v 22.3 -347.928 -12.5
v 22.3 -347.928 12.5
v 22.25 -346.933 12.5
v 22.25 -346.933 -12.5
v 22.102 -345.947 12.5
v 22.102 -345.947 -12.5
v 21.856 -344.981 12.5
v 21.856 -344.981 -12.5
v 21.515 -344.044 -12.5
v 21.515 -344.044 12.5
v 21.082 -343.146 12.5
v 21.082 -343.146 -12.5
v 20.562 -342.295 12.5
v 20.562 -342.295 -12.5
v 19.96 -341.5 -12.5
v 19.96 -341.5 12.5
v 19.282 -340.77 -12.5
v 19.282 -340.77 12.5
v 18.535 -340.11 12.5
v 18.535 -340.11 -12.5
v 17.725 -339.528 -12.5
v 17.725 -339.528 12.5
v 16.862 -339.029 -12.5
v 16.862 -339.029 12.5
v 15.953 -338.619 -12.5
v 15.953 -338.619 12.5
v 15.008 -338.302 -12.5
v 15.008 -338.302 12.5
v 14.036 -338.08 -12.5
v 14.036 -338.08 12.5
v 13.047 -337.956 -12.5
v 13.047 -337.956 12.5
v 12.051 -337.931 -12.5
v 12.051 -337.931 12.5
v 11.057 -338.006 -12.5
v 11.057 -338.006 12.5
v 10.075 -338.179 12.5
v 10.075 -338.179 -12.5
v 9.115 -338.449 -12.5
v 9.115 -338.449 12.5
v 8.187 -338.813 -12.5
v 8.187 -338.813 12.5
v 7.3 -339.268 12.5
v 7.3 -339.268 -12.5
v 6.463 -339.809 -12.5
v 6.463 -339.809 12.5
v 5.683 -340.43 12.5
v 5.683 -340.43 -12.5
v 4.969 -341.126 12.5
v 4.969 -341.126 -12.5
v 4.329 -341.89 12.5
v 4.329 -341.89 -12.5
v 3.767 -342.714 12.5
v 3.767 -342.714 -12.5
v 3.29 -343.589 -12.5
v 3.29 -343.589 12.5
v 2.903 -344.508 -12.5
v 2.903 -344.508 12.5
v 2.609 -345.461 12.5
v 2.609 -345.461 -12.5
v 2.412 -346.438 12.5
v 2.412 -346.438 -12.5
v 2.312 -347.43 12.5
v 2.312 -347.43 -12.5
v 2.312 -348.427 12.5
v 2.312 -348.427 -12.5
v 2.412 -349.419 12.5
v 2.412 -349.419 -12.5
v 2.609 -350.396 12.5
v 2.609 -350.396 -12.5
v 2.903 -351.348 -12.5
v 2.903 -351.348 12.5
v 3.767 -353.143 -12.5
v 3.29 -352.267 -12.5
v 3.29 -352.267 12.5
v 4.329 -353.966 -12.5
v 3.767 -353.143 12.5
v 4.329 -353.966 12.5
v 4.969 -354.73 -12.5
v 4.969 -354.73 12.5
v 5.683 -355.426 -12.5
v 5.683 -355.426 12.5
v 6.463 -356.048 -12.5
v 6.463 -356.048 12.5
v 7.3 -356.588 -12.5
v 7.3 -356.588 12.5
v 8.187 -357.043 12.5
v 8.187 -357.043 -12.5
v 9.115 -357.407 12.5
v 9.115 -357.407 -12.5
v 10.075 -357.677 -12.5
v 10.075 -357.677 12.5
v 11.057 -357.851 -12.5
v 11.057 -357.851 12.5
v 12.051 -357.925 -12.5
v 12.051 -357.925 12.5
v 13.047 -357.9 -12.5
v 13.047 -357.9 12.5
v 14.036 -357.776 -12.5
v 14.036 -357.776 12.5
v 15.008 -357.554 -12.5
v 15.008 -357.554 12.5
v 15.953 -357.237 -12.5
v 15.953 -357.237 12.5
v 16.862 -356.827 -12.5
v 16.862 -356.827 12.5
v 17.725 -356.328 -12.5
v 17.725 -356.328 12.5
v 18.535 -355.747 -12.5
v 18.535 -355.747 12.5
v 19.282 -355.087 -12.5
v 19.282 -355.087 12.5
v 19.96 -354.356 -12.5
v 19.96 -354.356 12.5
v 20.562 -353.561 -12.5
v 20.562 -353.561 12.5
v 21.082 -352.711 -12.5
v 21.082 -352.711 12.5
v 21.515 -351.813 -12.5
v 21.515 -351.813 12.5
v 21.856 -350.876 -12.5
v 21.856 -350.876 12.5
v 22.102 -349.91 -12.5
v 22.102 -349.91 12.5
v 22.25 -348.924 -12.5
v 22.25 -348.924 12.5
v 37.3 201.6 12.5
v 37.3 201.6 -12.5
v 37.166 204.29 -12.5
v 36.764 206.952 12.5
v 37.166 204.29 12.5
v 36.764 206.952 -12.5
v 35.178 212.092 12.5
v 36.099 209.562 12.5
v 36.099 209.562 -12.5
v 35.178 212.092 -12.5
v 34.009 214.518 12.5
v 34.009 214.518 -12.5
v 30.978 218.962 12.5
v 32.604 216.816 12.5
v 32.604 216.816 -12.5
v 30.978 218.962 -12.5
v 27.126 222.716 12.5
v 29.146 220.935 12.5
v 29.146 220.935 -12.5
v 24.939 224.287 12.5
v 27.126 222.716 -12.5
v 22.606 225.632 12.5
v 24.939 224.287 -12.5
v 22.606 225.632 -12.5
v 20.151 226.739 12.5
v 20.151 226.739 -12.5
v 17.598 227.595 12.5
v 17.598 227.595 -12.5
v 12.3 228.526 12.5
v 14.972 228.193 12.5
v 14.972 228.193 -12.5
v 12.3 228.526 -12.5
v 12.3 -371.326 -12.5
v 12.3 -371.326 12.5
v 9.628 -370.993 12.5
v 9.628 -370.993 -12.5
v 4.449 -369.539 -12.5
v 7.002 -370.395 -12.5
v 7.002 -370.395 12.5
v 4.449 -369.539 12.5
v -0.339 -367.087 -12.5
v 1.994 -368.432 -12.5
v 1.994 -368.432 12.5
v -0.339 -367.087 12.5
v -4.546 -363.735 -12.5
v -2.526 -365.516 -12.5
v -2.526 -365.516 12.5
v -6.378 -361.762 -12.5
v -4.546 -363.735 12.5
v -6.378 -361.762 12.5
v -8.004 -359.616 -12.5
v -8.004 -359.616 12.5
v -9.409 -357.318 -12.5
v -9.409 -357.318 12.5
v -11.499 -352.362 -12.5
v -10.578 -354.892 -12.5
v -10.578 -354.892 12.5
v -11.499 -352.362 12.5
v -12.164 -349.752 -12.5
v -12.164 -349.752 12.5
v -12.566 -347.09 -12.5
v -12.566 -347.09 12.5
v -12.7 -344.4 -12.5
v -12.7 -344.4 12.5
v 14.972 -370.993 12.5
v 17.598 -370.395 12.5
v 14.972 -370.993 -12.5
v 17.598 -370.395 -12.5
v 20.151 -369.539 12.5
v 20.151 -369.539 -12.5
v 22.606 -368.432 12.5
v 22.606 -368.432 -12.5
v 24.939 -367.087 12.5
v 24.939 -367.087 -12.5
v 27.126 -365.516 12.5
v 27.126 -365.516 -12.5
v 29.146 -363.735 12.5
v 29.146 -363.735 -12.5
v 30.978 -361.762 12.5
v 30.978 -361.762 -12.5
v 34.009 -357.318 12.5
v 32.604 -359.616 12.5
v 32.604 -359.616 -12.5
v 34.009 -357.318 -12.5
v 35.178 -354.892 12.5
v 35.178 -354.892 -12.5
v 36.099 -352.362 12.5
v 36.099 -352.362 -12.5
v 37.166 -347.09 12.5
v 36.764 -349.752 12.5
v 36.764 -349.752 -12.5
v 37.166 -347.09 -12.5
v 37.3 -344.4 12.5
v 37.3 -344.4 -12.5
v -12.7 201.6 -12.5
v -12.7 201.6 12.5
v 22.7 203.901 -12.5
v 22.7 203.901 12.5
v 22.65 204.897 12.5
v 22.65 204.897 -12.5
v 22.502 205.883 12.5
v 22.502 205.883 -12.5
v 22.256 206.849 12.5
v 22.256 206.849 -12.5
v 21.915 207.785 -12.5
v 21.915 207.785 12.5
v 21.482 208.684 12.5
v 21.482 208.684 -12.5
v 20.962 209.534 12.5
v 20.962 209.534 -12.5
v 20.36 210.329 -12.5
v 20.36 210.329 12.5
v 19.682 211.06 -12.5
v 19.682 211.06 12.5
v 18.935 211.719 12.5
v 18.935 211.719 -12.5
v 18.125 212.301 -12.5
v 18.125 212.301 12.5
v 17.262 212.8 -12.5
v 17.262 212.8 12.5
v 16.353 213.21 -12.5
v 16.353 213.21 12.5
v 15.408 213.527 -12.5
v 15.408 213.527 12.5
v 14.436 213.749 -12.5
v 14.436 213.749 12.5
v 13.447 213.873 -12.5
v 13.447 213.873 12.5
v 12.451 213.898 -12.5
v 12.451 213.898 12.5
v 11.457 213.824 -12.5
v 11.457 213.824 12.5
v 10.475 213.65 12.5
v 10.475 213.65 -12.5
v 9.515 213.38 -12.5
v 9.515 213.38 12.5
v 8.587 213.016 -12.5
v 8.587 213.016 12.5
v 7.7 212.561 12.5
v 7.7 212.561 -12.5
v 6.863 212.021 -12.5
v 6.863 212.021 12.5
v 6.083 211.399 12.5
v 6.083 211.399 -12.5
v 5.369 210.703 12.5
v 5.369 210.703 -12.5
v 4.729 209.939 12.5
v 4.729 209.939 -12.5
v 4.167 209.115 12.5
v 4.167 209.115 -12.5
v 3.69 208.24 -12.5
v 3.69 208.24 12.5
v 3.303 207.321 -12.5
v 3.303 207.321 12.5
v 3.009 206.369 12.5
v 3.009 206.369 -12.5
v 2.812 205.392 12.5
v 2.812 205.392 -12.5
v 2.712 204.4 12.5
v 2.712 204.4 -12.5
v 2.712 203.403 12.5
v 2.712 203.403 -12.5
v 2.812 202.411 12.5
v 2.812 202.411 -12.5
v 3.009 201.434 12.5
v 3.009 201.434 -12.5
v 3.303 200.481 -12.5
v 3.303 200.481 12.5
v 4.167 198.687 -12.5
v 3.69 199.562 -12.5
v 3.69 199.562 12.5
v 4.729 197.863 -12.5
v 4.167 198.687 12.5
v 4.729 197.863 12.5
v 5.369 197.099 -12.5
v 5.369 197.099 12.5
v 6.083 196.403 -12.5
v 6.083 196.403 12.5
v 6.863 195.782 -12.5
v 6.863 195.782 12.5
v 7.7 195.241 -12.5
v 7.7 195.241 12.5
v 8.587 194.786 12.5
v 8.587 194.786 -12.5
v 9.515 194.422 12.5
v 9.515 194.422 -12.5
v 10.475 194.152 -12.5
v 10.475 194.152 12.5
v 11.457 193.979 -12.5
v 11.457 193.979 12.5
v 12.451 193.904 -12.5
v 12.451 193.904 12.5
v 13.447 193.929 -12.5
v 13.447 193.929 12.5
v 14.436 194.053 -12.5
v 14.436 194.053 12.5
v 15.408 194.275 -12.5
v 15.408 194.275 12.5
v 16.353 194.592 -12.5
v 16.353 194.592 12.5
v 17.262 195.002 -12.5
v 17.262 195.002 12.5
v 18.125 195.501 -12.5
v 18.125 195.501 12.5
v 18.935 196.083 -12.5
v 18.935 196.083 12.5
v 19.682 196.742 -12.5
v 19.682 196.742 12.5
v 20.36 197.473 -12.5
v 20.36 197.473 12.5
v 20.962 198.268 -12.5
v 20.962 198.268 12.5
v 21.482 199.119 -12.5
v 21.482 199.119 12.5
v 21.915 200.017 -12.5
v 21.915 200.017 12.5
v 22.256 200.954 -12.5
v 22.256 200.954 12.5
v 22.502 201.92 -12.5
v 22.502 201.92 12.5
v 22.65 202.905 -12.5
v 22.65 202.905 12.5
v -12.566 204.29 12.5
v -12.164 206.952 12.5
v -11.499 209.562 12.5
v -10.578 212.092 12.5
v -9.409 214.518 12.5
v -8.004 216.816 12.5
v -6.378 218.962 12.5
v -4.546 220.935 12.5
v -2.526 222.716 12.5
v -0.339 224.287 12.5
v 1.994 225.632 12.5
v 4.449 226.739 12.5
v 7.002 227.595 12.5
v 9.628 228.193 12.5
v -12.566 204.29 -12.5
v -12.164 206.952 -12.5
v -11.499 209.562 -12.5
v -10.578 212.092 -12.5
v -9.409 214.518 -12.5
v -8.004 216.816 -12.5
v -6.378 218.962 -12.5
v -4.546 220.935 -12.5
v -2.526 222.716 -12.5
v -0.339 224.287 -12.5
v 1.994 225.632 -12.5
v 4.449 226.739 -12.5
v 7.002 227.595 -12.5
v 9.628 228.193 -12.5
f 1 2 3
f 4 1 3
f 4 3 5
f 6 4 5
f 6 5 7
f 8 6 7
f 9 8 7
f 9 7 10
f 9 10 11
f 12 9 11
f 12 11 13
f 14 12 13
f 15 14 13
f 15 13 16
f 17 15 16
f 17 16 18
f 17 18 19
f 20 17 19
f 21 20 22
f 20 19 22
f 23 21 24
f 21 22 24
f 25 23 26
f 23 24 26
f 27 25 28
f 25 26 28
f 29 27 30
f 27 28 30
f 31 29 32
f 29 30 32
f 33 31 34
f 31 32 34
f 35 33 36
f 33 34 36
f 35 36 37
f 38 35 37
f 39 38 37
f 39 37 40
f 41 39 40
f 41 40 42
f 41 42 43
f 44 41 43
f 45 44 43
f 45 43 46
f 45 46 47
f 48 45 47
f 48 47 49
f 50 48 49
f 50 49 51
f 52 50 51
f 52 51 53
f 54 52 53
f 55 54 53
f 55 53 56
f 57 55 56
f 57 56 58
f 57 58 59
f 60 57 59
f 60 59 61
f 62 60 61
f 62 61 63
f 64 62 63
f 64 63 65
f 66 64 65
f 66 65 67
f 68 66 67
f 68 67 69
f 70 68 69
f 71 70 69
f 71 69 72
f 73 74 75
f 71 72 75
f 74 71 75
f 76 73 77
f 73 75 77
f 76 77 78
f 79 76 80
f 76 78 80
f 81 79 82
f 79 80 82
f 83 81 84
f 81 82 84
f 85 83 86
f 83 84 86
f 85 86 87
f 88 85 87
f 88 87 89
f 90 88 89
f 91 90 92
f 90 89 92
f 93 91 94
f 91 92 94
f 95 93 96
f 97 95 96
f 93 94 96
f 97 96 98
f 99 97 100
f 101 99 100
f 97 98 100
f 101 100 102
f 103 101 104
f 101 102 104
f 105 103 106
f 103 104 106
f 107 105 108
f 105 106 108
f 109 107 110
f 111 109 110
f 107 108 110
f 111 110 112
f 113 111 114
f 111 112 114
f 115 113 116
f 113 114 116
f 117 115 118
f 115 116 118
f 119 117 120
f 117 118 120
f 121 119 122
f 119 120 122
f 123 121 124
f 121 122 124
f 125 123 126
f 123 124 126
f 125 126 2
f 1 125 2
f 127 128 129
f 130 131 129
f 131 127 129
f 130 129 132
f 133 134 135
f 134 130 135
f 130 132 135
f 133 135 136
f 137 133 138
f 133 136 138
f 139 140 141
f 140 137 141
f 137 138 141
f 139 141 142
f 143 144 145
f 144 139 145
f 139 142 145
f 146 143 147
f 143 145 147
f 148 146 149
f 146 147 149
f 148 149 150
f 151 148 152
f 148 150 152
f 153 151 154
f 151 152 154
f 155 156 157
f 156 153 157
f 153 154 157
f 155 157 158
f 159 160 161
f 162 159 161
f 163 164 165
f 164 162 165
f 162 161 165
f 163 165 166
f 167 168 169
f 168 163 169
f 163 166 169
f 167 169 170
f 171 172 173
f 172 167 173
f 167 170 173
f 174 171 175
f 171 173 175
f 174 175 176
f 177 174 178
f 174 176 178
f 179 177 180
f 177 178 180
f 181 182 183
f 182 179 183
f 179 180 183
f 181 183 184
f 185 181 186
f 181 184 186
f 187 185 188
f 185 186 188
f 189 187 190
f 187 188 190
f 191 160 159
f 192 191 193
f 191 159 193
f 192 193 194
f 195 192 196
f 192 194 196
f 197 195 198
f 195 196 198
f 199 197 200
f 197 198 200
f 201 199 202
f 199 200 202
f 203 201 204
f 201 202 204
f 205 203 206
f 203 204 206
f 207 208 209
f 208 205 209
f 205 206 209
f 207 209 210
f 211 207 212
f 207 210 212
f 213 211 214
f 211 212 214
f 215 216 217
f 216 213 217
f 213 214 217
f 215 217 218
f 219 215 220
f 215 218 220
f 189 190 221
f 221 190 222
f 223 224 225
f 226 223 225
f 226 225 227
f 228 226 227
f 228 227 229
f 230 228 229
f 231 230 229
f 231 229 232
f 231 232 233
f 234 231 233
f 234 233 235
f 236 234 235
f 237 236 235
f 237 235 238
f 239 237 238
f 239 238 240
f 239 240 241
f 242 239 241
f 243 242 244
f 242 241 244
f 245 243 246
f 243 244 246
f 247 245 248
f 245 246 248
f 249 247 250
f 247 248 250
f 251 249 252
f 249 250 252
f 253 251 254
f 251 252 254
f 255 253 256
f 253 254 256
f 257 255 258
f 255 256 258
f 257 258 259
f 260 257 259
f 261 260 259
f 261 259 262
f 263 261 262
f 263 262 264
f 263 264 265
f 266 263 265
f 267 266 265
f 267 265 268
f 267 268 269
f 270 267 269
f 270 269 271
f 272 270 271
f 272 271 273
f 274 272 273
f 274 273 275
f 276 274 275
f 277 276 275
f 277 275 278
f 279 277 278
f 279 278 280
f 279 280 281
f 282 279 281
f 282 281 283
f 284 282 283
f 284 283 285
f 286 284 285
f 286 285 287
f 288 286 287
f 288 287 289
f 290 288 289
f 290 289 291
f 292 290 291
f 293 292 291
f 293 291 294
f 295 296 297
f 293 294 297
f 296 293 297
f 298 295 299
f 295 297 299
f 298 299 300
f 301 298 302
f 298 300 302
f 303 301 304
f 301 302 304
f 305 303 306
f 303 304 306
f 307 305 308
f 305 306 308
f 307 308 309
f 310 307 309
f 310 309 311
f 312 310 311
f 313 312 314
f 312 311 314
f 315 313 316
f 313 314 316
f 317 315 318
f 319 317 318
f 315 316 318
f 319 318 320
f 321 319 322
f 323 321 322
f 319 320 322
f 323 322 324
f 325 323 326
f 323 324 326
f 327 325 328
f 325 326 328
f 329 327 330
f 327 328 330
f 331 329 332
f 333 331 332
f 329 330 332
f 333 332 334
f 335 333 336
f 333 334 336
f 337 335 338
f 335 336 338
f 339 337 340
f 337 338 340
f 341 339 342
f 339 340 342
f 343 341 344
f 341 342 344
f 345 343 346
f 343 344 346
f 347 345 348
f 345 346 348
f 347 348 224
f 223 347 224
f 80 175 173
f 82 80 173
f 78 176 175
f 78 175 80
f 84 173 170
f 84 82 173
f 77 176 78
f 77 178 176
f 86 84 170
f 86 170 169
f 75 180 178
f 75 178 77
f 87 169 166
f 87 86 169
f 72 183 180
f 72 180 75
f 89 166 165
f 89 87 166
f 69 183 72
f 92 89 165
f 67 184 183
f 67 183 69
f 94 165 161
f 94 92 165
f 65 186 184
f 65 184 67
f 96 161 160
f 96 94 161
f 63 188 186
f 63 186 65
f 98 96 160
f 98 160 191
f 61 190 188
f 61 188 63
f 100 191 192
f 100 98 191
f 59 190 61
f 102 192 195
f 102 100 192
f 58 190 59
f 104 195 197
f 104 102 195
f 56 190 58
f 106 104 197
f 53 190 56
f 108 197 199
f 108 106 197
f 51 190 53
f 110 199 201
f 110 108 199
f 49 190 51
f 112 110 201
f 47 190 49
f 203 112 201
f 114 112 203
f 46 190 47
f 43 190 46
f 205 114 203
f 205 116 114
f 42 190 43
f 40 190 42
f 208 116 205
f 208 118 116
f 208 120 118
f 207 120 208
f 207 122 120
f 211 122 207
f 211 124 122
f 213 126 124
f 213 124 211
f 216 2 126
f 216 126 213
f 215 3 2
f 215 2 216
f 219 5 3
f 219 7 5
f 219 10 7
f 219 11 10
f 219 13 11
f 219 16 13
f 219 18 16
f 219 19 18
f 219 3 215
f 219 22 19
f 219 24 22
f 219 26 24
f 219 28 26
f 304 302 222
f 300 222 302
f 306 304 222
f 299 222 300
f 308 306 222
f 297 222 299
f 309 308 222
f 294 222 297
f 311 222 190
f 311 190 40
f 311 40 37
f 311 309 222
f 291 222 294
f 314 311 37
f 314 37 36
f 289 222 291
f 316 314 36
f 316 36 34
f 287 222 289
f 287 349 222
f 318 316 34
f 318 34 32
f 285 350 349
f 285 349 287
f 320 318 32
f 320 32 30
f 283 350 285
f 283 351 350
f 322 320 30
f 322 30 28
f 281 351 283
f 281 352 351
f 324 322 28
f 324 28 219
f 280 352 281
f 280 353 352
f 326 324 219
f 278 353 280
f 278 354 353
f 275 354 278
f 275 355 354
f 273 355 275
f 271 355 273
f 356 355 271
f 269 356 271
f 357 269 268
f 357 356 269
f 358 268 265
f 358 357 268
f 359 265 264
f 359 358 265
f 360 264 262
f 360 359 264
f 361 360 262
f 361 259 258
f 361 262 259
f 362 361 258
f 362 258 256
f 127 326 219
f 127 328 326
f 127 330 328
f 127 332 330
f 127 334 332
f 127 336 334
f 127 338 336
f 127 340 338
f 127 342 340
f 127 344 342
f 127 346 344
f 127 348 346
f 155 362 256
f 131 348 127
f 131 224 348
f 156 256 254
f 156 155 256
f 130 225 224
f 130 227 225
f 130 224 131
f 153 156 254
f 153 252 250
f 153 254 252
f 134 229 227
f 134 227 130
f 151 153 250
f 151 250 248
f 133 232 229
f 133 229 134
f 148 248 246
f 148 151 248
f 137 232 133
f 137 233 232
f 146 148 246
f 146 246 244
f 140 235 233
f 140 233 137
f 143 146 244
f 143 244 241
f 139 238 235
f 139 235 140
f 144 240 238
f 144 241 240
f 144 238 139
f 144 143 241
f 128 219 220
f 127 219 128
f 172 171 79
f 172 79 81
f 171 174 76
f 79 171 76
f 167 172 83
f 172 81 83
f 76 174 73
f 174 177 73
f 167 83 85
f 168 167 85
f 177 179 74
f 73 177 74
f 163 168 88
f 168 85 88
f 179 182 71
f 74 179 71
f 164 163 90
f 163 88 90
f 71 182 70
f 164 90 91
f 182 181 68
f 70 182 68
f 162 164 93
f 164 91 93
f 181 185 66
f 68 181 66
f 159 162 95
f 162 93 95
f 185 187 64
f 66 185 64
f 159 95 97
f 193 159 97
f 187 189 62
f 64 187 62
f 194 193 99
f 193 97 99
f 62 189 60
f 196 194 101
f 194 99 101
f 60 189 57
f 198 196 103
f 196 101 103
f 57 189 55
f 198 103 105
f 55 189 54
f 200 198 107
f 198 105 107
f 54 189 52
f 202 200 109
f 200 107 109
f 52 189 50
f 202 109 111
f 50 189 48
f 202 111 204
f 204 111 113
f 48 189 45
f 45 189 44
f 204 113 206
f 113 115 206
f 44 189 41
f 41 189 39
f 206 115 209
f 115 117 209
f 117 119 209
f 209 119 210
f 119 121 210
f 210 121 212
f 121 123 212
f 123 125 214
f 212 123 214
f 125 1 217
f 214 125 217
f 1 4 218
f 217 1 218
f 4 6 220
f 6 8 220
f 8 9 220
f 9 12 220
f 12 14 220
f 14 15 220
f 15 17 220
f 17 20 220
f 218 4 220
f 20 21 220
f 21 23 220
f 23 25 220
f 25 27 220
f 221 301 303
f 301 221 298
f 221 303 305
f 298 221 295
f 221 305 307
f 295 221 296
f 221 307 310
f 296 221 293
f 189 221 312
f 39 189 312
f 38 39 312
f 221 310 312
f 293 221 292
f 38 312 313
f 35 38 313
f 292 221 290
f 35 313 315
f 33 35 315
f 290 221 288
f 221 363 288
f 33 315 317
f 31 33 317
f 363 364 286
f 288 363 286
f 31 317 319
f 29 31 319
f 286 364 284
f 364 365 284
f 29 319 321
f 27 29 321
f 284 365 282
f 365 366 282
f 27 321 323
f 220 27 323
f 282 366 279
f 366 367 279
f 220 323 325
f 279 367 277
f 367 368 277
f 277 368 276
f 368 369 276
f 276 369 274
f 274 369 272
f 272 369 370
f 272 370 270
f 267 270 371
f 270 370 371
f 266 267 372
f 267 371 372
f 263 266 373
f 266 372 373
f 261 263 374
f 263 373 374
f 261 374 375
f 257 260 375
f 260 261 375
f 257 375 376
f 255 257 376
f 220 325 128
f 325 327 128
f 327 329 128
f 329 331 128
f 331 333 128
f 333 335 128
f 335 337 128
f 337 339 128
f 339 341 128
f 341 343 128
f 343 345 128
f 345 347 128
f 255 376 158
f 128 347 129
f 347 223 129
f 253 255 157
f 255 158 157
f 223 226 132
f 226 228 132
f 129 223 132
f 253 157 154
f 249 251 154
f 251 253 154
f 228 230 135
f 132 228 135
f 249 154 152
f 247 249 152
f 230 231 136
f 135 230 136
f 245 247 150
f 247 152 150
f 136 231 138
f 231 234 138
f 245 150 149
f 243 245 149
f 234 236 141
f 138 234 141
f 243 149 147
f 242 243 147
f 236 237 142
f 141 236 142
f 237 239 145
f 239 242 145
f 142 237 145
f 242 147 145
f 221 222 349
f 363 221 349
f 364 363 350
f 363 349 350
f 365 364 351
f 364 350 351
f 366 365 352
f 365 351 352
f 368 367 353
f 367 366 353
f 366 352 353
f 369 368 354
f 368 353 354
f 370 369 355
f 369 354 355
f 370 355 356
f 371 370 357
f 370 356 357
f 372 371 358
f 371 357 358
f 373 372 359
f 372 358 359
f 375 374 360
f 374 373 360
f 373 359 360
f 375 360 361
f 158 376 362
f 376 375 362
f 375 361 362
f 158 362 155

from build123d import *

# Parameters (mm, degrees)
SKETCH7_W           = 50
SKETCH7_H           = 600
BOSS_EXTRUDE1_DEPTH = 12.5
FILLET1_R           = 27
SKETCH8_R           = 10
CUT_EXTRUDE1_DEPTH  = 375.030958071
SKETCH9_R           = 10
CUT_EXTRUDE2_DEPTH  = 375.030958071


with BuildPart() as part:
    # Sketch7 → Boss-Extrude1 (new, symmetric)
    with BuildSketch(Plane.XY):
        with Locations((12.3, -71.4)):
            Rectangle(SKETCH7_W, SKETCH7_H)
    extrude(amount=BOSS_EXTRUDE1_DEPTH, both=True)

    # Fillet1
    # the kernel refuses this fillet: 27 mm, written as the material it takes off along each edge
    with BuildSketch(Plane(origin=(37.3, -371.4, -80), x_dir=(-1, 0, 0), z_dir=(0, 0, 1)), Plane(origin=(-12.7, -371.4, 80), x_dir=(1, 0, 0), z_dir=(0, 0, -1))) as fillet1_piece_1:
        with BuildLine():
            CenterArc((FILLET1_R, -FILLET1_R), FILLET1_R, 90, 90)
            Line((0, -FILLET1_R), (0, 0))
            Line((0, 0), (FILLET1_R, 0))
        make_face()
    extrude(amount=160, mode=Mode.SUBTRACT)
    with BuildSketch(Plane(origin=(-12.7, 228.6, 80), x_dir=(1, 0, 0), z_dir=(0, 0, -1)), Plane(origin=(37.3, 228.6, -80), x_dir=(-1, 0, 0), z_dir=(0, 0, 1))) as fillet1_piece_2:
        with BuildLine():
            CenterArc((FILLET1_R, FILLET1_R), FILLET1_R, 180, 90)
            Line((0, FILLET1_R), (0, 0))
            Line((0, 0), (FILLET1_R, 0))
        make_face()
    extrude(amount=160, mode=Mode.SUBTRACT)

    # Sketch8 → Cut-Extrude1 (cut, through all)
    with BuildSketch(Plane.XY.offset(12.5)):
        with Locations((12.7, 203.901138173)):
            Circle(SKETCH8_R)
    extrude(amount=-CUT_EXTRUDE1_DEPTH, mode=Mode.SUBTRACT)

    # Sketch9 → Cut-Extrude2 (cut, through all)
    with BuildSketch(Plane.XY.offset(12.5)):
        with Locations((12.3, -347.928194148)):
            Circle(SKETCH9_R)
    extrude(amount=-CUT_EXTRUDE2_DEPTH, mode=Mode.SUBTRACT)


solid = part.part
